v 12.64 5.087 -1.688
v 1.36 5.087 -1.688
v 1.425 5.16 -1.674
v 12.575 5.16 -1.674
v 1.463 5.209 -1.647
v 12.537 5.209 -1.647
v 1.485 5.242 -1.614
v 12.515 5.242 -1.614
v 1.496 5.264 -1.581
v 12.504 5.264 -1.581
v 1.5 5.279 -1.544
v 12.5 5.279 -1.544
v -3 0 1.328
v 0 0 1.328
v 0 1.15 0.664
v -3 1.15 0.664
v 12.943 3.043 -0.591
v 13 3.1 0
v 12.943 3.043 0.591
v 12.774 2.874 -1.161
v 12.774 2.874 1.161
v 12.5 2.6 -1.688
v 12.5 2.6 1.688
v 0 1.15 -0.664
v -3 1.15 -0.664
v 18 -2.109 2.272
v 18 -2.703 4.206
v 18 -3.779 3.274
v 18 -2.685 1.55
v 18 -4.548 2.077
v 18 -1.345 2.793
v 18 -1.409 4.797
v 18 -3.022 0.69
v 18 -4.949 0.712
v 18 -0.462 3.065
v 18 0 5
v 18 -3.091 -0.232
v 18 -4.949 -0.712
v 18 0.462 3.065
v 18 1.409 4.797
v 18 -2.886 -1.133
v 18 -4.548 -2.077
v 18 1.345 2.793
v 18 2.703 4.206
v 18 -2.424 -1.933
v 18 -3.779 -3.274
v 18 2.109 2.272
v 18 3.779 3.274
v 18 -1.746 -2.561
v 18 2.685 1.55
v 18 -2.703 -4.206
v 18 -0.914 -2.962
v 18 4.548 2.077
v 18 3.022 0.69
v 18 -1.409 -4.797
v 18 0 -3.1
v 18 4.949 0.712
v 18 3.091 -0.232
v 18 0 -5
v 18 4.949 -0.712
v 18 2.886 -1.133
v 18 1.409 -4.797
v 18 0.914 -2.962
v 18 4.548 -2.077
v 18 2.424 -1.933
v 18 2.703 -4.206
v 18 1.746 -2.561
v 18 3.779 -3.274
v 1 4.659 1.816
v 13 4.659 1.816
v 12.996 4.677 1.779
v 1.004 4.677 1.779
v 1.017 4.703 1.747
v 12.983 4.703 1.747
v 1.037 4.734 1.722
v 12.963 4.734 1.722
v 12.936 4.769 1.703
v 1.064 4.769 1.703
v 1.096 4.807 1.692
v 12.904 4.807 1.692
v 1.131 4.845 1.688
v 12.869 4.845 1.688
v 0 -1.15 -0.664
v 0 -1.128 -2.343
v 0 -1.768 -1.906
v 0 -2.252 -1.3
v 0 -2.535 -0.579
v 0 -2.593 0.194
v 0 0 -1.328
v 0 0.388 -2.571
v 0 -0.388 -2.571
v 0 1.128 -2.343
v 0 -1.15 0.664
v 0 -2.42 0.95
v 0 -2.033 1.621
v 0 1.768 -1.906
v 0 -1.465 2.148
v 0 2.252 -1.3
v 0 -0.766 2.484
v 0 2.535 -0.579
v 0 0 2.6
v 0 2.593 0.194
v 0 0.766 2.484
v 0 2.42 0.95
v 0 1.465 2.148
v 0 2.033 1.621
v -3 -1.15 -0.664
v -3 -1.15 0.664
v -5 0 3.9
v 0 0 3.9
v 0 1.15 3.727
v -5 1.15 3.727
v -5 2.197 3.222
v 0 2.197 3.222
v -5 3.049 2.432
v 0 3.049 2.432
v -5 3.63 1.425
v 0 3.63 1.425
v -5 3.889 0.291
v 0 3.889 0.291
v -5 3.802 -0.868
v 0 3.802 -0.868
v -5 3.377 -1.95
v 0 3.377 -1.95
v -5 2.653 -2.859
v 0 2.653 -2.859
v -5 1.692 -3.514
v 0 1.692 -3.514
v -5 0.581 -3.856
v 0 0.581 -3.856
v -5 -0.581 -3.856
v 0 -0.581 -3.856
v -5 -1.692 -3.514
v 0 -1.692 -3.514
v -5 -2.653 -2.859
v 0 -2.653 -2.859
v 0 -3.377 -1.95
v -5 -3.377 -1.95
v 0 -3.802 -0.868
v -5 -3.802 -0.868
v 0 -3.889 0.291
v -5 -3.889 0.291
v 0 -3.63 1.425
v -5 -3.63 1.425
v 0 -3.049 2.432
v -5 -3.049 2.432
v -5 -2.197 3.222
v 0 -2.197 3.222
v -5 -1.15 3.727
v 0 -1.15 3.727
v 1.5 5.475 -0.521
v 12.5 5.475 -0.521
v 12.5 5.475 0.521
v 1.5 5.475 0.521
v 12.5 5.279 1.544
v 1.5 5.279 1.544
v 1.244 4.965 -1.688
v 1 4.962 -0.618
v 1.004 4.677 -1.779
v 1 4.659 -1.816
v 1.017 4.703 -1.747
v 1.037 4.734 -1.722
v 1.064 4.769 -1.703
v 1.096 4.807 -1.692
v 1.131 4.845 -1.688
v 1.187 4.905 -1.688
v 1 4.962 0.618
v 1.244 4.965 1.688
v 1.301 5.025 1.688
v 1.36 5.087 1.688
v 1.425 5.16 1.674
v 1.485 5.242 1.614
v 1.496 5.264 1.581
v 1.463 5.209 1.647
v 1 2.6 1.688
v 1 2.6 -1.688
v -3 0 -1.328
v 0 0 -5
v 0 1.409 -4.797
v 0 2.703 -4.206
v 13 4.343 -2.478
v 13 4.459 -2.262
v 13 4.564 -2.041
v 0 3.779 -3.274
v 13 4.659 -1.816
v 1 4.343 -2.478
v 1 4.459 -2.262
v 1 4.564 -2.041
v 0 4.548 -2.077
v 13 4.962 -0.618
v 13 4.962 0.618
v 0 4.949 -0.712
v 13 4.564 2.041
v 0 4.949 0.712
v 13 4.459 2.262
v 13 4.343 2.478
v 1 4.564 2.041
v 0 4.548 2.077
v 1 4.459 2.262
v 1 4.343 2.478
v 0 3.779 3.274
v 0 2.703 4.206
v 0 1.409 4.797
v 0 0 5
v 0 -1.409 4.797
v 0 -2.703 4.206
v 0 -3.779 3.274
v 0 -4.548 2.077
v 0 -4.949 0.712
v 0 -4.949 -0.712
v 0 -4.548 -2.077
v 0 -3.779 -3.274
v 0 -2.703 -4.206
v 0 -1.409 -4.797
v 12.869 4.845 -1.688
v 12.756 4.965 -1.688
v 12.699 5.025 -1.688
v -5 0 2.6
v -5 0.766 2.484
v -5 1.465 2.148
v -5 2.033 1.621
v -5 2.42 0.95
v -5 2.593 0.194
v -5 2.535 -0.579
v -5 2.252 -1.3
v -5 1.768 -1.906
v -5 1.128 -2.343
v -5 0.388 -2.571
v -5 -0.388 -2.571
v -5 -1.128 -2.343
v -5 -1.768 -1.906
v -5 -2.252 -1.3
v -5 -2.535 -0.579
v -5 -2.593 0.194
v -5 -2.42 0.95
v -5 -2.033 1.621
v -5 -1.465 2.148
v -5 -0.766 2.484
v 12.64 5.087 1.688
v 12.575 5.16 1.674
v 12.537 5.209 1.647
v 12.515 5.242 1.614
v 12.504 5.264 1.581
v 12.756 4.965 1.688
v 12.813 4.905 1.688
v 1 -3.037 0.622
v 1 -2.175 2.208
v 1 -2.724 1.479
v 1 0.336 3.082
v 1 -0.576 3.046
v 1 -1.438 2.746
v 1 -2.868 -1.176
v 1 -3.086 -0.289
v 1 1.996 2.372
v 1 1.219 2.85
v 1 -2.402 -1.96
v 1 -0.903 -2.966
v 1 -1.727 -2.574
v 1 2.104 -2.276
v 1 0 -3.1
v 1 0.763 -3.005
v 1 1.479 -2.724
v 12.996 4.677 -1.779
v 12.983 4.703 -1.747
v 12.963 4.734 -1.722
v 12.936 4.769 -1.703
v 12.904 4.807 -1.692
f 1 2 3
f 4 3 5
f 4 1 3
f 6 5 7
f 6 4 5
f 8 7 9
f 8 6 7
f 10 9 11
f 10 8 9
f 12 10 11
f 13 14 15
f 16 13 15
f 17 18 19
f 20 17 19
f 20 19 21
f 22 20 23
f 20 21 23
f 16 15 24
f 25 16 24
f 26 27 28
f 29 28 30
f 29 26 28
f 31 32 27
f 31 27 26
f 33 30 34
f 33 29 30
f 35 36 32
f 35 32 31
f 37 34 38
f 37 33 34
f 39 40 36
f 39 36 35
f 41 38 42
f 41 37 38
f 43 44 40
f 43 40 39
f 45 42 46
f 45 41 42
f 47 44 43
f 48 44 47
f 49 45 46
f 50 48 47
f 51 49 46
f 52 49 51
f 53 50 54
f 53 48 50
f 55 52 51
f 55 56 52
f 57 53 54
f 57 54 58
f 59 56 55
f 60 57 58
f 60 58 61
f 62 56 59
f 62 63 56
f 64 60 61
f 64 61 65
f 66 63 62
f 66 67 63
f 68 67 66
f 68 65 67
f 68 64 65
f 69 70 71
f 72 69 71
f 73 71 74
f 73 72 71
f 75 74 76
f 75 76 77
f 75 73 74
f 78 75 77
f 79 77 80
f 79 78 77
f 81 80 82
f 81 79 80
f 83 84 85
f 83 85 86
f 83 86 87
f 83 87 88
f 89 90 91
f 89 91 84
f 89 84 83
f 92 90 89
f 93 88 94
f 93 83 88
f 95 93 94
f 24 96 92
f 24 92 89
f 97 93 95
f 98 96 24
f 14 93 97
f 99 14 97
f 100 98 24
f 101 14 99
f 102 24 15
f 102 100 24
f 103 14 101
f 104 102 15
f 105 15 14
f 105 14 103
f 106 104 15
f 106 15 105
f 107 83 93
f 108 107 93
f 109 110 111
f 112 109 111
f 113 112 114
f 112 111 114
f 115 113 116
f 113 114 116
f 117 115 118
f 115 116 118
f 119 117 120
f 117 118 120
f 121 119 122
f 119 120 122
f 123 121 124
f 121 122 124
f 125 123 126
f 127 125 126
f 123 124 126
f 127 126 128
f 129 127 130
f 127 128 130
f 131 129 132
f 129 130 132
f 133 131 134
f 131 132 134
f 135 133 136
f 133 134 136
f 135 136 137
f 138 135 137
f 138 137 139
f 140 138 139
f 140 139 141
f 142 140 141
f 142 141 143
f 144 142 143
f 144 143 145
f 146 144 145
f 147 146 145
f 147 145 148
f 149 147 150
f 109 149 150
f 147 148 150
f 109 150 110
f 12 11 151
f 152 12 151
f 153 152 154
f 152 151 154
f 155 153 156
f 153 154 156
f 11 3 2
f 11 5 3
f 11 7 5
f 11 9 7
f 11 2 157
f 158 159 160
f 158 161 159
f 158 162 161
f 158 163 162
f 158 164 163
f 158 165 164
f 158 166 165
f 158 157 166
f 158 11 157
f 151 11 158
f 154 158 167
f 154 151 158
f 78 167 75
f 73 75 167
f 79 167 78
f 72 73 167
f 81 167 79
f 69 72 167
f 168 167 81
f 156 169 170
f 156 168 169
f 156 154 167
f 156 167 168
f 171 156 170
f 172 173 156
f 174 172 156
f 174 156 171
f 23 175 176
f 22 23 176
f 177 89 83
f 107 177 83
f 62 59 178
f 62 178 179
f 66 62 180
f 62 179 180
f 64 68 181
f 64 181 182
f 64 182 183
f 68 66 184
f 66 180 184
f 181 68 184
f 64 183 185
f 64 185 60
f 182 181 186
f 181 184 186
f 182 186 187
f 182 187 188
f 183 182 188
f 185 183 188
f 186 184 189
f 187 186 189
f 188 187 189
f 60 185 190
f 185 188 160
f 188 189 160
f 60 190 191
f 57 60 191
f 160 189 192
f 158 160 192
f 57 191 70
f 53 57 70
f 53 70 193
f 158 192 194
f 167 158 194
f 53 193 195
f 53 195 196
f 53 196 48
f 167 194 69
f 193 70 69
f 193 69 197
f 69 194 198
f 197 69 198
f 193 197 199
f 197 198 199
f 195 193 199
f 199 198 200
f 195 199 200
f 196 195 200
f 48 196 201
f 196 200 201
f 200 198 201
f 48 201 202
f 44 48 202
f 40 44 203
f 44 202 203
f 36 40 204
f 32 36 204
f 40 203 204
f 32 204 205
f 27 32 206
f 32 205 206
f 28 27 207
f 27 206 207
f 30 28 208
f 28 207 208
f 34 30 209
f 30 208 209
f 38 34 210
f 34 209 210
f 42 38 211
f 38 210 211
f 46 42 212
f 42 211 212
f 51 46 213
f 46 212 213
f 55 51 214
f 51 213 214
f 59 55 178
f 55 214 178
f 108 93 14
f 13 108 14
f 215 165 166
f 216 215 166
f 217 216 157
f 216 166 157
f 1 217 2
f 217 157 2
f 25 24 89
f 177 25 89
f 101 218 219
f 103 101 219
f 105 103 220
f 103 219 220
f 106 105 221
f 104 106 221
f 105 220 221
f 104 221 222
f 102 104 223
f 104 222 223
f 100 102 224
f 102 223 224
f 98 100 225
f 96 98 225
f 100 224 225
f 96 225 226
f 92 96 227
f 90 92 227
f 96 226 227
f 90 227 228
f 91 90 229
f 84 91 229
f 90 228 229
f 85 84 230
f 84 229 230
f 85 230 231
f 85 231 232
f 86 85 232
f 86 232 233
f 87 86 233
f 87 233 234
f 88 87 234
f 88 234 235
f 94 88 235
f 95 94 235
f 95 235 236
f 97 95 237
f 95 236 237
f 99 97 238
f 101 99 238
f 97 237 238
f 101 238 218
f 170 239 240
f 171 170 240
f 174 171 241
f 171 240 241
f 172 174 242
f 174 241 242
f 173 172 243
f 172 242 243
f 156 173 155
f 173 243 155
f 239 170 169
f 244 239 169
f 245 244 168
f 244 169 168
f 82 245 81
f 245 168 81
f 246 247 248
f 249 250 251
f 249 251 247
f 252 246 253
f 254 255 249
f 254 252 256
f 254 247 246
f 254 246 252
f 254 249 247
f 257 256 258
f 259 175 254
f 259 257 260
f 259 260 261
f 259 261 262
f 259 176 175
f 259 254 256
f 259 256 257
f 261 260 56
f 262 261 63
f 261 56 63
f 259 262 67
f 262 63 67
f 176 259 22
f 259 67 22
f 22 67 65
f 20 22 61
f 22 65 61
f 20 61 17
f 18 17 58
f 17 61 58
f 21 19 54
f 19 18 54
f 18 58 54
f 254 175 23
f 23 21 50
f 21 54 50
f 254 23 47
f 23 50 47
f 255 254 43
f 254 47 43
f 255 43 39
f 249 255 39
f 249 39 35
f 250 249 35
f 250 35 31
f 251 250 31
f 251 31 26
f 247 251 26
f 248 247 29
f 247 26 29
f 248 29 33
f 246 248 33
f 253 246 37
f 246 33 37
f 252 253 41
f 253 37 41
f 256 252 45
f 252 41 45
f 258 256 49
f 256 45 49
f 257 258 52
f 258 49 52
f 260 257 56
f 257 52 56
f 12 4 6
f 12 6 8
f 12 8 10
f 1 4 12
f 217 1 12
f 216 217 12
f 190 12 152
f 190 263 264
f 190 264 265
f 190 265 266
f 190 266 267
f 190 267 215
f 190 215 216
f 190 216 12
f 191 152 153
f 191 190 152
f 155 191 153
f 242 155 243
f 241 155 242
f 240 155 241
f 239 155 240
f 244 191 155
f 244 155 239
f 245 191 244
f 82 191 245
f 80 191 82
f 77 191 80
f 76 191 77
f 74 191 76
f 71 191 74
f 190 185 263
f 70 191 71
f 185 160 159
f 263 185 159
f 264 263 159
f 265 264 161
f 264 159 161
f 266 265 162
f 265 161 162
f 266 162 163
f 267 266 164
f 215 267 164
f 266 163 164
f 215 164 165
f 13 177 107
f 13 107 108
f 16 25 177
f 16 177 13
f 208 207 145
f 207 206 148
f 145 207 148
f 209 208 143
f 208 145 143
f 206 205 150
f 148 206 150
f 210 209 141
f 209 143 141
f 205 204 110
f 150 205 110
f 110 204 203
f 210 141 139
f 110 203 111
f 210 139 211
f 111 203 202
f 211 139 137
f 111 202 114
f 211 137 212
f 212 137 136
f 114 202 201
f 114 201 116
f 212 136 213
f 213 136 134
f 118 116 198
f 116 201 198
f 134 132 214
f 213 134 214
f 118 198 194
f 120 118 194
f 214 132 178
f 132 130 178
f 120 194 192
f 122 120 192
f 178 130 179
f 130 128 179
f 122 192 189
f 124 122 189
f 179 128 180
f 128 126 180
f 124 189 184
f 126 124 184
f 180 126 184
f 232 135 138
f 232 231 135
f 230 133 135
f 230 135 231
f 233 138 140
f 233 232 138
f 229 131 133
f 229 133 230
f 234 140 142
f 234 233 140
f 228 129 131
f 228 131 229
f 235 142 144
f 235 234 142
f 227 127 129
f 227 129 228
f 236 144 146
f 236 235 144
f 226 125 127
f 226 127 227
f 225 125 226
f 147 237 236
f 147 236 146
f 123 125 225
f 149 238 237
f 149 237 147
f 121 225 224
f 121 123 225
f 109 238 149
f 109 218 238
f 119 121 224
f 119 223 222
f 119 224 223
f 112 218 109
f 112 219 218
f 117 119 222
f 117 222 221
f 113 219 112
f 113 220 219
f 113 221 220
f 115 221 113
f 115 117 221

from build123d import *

# Parameters (mm, degrees)
SKETCH_1_R          = 5
EXTRUDE_1_DEPTH     = 18
SKETCH_3_R          = 3.1
CUT_EXTRUDE_1_DEPTH = 17
EXTRUDE_2_DEPTH     = 12
SKETCH_8_R          = 3.9
EXTRUDE_4_DEPTH     = 5
SKETCH_9_R          = 2.6
CUT_EXTRUDE_2_DEPTH = 5
EXTRUDE_5_DEPTH     = 3
FILLET_1_R          = 0.2
CHAMFER_1_SIZE      = 0.5


with BuildPart() as part:
    # 草图1 → 凸台-拉伸1 (new body)
    with BuildSketch(Plane(origin=(0, 0, 0), x_dir=(0, 0, -1), z_dir=(1, 0, 0))):
        Circle(SKETCH_1_R)
    extrude(amount=EXTRUDE_1_DEPTH)

    # 草图3 → 切除-拉伸1 (cut)
    with BuildSketch(Plane(origin=(18, 0, 0), x_dir=(0, 0, -1), z_dir=(1, 0, 0))):
        Circle(SKETCH_3_R)
    extrude(amount=-CUT_EXTRUDE_1_DEPTH, mode=Mode.SUBTRACT)

    # 草图5 → 凸台-拉伸2 (add)
    with BuildSketch(Plane(origin=(1, 0, 0), x_dir=(0, 0, -1), z_dir=(1, 0, 0))):
        with BuildLine():
            Line((-1.688194302, 2.6), (1.688194302, 2.6))
            Line((1.688194302, 2.6), (1.688194302, 5.234500931))
            ThreePointArc((1.688194302, 5.234500931), (0, 5.5), (-1.688194302, 5.234500931))
            Line((-1.688194302, 5.234500931), (-1.688194302, 2.6))
        make_face()
    extrude(amount=EXTRUDE_2_DEPTH)

    # 草图8 → 凸台-拉伸4 (add)
    with BuildSketch(Plane.ZY):
        Circle(SKETCH_8_R)
    extrude(amount=EXTRUDE_4_DEPTH)

    # 草图9 → 切除-拉伸2 (cut)
    with BuildSketch(Plane.ZY.offset(5)):
        Circle(SKETCH_9_R)
    extrude(amount=-CUT_EXTRUDE_2_DEPTH, mode=Mode.SUBTRACT)

    # 草图10 → 凸台-拉伸5 (add)
    with BuildSketch(Plane.ZY):
        Polygon((0.66395281, 1.15), (-0.66395281, 1.15), (-1.327905619, 0), (-0.66395281, -1.15), (0.66395281, -1.15), (1.327905619, 0), align=None)
    extrude(amount=EXTRUDE_5_DEPTH)

    # 圆角1
    fillet_1_edges = [part.edges().sort_by_distance(p)[0] for p in [
        (7, 4.70637865, 1.688194302),
        (7, 5.234500931, 1.688194302),
        (7, 4.70637865, -1.688194302),
        (7, 5.234500931, -1.688194302),
    ]]
    fillet(fillet_1_edges, radius=FILLET_1_R)

    # 倒角1
    # the kernel refuses this chamfer: 0.5 mm, written as the material it takes off along each edge
    with BuildSketch(Plane(origin=(13, 0, 0), x_dir=(0, 0.8686030413593419, -0.4955085837211114), z_dir=(0, -0.4955085837211114, -0.8686030413593419))) as chamfer_1_piece_1:
        Polygon((5.5, -CHAMFER_1_SIZE), (5.5 - CHAMFER_1_SIZE, 0), (5.5, 0), align=None)
    revolve(axis=Axis((13, 0, 0), (1, 0, 0)), revolution_arc=59.40658503, mode=Mode.SUBTRACT)
    with BuildSketch(Plane(origin=(1, 0, 0), x_dir=(0, 0.8686030413593416, -0.4955085837211117), z_dir=(0, -0.4955085837211117, -0.8686030413593416))) as chamfer_1_piece_2:
        Polygon((5.5 - CHAMFER_1_SIZE, 0), (5.5, CHAMFER_1_SIZE), (5.5, 0), align=None)
    revolve(axis=Axis((1, 0, 0), (1, 0, 0)), revolution_arc=59.40658503, mode=Mode.SUBTRACT)
    with BuildSketch(Plane(origin=(13, 2.6, 2.974035796), x_dir=(0.027495876610585623, 0.9996219169112968, 0), z_dir=(0, 0, -1))) as chamfer_1_piece_3_section:
        Polygon((CHAMFER_1_SIZE * 0.999621916911, -CHAMFER_1_SIZE * 0.0274958766106), (-CHAMFER_1_SIZE * 0.0274958766106, -CHAMFER_1_SIZE * 0.999621916911), (0, 0), align=None)
    chamfer_1_piece_3 = extrude(amount=5.948071591, mode=Mode.PRIVATE)
    chamfer_1_piece_3 = chamfer_1_piece_3 & Plane(origin=(12.821912141, 0, 0), x_dir=(0, 0, -1), z_dir=(1, 0, 0)) * Cylinder(3.1, 14, mode=Mode.PRIVATE)
    add(chamfer_1_piece_3, mode=Mode.SUBTRACT)


solid = part.part
